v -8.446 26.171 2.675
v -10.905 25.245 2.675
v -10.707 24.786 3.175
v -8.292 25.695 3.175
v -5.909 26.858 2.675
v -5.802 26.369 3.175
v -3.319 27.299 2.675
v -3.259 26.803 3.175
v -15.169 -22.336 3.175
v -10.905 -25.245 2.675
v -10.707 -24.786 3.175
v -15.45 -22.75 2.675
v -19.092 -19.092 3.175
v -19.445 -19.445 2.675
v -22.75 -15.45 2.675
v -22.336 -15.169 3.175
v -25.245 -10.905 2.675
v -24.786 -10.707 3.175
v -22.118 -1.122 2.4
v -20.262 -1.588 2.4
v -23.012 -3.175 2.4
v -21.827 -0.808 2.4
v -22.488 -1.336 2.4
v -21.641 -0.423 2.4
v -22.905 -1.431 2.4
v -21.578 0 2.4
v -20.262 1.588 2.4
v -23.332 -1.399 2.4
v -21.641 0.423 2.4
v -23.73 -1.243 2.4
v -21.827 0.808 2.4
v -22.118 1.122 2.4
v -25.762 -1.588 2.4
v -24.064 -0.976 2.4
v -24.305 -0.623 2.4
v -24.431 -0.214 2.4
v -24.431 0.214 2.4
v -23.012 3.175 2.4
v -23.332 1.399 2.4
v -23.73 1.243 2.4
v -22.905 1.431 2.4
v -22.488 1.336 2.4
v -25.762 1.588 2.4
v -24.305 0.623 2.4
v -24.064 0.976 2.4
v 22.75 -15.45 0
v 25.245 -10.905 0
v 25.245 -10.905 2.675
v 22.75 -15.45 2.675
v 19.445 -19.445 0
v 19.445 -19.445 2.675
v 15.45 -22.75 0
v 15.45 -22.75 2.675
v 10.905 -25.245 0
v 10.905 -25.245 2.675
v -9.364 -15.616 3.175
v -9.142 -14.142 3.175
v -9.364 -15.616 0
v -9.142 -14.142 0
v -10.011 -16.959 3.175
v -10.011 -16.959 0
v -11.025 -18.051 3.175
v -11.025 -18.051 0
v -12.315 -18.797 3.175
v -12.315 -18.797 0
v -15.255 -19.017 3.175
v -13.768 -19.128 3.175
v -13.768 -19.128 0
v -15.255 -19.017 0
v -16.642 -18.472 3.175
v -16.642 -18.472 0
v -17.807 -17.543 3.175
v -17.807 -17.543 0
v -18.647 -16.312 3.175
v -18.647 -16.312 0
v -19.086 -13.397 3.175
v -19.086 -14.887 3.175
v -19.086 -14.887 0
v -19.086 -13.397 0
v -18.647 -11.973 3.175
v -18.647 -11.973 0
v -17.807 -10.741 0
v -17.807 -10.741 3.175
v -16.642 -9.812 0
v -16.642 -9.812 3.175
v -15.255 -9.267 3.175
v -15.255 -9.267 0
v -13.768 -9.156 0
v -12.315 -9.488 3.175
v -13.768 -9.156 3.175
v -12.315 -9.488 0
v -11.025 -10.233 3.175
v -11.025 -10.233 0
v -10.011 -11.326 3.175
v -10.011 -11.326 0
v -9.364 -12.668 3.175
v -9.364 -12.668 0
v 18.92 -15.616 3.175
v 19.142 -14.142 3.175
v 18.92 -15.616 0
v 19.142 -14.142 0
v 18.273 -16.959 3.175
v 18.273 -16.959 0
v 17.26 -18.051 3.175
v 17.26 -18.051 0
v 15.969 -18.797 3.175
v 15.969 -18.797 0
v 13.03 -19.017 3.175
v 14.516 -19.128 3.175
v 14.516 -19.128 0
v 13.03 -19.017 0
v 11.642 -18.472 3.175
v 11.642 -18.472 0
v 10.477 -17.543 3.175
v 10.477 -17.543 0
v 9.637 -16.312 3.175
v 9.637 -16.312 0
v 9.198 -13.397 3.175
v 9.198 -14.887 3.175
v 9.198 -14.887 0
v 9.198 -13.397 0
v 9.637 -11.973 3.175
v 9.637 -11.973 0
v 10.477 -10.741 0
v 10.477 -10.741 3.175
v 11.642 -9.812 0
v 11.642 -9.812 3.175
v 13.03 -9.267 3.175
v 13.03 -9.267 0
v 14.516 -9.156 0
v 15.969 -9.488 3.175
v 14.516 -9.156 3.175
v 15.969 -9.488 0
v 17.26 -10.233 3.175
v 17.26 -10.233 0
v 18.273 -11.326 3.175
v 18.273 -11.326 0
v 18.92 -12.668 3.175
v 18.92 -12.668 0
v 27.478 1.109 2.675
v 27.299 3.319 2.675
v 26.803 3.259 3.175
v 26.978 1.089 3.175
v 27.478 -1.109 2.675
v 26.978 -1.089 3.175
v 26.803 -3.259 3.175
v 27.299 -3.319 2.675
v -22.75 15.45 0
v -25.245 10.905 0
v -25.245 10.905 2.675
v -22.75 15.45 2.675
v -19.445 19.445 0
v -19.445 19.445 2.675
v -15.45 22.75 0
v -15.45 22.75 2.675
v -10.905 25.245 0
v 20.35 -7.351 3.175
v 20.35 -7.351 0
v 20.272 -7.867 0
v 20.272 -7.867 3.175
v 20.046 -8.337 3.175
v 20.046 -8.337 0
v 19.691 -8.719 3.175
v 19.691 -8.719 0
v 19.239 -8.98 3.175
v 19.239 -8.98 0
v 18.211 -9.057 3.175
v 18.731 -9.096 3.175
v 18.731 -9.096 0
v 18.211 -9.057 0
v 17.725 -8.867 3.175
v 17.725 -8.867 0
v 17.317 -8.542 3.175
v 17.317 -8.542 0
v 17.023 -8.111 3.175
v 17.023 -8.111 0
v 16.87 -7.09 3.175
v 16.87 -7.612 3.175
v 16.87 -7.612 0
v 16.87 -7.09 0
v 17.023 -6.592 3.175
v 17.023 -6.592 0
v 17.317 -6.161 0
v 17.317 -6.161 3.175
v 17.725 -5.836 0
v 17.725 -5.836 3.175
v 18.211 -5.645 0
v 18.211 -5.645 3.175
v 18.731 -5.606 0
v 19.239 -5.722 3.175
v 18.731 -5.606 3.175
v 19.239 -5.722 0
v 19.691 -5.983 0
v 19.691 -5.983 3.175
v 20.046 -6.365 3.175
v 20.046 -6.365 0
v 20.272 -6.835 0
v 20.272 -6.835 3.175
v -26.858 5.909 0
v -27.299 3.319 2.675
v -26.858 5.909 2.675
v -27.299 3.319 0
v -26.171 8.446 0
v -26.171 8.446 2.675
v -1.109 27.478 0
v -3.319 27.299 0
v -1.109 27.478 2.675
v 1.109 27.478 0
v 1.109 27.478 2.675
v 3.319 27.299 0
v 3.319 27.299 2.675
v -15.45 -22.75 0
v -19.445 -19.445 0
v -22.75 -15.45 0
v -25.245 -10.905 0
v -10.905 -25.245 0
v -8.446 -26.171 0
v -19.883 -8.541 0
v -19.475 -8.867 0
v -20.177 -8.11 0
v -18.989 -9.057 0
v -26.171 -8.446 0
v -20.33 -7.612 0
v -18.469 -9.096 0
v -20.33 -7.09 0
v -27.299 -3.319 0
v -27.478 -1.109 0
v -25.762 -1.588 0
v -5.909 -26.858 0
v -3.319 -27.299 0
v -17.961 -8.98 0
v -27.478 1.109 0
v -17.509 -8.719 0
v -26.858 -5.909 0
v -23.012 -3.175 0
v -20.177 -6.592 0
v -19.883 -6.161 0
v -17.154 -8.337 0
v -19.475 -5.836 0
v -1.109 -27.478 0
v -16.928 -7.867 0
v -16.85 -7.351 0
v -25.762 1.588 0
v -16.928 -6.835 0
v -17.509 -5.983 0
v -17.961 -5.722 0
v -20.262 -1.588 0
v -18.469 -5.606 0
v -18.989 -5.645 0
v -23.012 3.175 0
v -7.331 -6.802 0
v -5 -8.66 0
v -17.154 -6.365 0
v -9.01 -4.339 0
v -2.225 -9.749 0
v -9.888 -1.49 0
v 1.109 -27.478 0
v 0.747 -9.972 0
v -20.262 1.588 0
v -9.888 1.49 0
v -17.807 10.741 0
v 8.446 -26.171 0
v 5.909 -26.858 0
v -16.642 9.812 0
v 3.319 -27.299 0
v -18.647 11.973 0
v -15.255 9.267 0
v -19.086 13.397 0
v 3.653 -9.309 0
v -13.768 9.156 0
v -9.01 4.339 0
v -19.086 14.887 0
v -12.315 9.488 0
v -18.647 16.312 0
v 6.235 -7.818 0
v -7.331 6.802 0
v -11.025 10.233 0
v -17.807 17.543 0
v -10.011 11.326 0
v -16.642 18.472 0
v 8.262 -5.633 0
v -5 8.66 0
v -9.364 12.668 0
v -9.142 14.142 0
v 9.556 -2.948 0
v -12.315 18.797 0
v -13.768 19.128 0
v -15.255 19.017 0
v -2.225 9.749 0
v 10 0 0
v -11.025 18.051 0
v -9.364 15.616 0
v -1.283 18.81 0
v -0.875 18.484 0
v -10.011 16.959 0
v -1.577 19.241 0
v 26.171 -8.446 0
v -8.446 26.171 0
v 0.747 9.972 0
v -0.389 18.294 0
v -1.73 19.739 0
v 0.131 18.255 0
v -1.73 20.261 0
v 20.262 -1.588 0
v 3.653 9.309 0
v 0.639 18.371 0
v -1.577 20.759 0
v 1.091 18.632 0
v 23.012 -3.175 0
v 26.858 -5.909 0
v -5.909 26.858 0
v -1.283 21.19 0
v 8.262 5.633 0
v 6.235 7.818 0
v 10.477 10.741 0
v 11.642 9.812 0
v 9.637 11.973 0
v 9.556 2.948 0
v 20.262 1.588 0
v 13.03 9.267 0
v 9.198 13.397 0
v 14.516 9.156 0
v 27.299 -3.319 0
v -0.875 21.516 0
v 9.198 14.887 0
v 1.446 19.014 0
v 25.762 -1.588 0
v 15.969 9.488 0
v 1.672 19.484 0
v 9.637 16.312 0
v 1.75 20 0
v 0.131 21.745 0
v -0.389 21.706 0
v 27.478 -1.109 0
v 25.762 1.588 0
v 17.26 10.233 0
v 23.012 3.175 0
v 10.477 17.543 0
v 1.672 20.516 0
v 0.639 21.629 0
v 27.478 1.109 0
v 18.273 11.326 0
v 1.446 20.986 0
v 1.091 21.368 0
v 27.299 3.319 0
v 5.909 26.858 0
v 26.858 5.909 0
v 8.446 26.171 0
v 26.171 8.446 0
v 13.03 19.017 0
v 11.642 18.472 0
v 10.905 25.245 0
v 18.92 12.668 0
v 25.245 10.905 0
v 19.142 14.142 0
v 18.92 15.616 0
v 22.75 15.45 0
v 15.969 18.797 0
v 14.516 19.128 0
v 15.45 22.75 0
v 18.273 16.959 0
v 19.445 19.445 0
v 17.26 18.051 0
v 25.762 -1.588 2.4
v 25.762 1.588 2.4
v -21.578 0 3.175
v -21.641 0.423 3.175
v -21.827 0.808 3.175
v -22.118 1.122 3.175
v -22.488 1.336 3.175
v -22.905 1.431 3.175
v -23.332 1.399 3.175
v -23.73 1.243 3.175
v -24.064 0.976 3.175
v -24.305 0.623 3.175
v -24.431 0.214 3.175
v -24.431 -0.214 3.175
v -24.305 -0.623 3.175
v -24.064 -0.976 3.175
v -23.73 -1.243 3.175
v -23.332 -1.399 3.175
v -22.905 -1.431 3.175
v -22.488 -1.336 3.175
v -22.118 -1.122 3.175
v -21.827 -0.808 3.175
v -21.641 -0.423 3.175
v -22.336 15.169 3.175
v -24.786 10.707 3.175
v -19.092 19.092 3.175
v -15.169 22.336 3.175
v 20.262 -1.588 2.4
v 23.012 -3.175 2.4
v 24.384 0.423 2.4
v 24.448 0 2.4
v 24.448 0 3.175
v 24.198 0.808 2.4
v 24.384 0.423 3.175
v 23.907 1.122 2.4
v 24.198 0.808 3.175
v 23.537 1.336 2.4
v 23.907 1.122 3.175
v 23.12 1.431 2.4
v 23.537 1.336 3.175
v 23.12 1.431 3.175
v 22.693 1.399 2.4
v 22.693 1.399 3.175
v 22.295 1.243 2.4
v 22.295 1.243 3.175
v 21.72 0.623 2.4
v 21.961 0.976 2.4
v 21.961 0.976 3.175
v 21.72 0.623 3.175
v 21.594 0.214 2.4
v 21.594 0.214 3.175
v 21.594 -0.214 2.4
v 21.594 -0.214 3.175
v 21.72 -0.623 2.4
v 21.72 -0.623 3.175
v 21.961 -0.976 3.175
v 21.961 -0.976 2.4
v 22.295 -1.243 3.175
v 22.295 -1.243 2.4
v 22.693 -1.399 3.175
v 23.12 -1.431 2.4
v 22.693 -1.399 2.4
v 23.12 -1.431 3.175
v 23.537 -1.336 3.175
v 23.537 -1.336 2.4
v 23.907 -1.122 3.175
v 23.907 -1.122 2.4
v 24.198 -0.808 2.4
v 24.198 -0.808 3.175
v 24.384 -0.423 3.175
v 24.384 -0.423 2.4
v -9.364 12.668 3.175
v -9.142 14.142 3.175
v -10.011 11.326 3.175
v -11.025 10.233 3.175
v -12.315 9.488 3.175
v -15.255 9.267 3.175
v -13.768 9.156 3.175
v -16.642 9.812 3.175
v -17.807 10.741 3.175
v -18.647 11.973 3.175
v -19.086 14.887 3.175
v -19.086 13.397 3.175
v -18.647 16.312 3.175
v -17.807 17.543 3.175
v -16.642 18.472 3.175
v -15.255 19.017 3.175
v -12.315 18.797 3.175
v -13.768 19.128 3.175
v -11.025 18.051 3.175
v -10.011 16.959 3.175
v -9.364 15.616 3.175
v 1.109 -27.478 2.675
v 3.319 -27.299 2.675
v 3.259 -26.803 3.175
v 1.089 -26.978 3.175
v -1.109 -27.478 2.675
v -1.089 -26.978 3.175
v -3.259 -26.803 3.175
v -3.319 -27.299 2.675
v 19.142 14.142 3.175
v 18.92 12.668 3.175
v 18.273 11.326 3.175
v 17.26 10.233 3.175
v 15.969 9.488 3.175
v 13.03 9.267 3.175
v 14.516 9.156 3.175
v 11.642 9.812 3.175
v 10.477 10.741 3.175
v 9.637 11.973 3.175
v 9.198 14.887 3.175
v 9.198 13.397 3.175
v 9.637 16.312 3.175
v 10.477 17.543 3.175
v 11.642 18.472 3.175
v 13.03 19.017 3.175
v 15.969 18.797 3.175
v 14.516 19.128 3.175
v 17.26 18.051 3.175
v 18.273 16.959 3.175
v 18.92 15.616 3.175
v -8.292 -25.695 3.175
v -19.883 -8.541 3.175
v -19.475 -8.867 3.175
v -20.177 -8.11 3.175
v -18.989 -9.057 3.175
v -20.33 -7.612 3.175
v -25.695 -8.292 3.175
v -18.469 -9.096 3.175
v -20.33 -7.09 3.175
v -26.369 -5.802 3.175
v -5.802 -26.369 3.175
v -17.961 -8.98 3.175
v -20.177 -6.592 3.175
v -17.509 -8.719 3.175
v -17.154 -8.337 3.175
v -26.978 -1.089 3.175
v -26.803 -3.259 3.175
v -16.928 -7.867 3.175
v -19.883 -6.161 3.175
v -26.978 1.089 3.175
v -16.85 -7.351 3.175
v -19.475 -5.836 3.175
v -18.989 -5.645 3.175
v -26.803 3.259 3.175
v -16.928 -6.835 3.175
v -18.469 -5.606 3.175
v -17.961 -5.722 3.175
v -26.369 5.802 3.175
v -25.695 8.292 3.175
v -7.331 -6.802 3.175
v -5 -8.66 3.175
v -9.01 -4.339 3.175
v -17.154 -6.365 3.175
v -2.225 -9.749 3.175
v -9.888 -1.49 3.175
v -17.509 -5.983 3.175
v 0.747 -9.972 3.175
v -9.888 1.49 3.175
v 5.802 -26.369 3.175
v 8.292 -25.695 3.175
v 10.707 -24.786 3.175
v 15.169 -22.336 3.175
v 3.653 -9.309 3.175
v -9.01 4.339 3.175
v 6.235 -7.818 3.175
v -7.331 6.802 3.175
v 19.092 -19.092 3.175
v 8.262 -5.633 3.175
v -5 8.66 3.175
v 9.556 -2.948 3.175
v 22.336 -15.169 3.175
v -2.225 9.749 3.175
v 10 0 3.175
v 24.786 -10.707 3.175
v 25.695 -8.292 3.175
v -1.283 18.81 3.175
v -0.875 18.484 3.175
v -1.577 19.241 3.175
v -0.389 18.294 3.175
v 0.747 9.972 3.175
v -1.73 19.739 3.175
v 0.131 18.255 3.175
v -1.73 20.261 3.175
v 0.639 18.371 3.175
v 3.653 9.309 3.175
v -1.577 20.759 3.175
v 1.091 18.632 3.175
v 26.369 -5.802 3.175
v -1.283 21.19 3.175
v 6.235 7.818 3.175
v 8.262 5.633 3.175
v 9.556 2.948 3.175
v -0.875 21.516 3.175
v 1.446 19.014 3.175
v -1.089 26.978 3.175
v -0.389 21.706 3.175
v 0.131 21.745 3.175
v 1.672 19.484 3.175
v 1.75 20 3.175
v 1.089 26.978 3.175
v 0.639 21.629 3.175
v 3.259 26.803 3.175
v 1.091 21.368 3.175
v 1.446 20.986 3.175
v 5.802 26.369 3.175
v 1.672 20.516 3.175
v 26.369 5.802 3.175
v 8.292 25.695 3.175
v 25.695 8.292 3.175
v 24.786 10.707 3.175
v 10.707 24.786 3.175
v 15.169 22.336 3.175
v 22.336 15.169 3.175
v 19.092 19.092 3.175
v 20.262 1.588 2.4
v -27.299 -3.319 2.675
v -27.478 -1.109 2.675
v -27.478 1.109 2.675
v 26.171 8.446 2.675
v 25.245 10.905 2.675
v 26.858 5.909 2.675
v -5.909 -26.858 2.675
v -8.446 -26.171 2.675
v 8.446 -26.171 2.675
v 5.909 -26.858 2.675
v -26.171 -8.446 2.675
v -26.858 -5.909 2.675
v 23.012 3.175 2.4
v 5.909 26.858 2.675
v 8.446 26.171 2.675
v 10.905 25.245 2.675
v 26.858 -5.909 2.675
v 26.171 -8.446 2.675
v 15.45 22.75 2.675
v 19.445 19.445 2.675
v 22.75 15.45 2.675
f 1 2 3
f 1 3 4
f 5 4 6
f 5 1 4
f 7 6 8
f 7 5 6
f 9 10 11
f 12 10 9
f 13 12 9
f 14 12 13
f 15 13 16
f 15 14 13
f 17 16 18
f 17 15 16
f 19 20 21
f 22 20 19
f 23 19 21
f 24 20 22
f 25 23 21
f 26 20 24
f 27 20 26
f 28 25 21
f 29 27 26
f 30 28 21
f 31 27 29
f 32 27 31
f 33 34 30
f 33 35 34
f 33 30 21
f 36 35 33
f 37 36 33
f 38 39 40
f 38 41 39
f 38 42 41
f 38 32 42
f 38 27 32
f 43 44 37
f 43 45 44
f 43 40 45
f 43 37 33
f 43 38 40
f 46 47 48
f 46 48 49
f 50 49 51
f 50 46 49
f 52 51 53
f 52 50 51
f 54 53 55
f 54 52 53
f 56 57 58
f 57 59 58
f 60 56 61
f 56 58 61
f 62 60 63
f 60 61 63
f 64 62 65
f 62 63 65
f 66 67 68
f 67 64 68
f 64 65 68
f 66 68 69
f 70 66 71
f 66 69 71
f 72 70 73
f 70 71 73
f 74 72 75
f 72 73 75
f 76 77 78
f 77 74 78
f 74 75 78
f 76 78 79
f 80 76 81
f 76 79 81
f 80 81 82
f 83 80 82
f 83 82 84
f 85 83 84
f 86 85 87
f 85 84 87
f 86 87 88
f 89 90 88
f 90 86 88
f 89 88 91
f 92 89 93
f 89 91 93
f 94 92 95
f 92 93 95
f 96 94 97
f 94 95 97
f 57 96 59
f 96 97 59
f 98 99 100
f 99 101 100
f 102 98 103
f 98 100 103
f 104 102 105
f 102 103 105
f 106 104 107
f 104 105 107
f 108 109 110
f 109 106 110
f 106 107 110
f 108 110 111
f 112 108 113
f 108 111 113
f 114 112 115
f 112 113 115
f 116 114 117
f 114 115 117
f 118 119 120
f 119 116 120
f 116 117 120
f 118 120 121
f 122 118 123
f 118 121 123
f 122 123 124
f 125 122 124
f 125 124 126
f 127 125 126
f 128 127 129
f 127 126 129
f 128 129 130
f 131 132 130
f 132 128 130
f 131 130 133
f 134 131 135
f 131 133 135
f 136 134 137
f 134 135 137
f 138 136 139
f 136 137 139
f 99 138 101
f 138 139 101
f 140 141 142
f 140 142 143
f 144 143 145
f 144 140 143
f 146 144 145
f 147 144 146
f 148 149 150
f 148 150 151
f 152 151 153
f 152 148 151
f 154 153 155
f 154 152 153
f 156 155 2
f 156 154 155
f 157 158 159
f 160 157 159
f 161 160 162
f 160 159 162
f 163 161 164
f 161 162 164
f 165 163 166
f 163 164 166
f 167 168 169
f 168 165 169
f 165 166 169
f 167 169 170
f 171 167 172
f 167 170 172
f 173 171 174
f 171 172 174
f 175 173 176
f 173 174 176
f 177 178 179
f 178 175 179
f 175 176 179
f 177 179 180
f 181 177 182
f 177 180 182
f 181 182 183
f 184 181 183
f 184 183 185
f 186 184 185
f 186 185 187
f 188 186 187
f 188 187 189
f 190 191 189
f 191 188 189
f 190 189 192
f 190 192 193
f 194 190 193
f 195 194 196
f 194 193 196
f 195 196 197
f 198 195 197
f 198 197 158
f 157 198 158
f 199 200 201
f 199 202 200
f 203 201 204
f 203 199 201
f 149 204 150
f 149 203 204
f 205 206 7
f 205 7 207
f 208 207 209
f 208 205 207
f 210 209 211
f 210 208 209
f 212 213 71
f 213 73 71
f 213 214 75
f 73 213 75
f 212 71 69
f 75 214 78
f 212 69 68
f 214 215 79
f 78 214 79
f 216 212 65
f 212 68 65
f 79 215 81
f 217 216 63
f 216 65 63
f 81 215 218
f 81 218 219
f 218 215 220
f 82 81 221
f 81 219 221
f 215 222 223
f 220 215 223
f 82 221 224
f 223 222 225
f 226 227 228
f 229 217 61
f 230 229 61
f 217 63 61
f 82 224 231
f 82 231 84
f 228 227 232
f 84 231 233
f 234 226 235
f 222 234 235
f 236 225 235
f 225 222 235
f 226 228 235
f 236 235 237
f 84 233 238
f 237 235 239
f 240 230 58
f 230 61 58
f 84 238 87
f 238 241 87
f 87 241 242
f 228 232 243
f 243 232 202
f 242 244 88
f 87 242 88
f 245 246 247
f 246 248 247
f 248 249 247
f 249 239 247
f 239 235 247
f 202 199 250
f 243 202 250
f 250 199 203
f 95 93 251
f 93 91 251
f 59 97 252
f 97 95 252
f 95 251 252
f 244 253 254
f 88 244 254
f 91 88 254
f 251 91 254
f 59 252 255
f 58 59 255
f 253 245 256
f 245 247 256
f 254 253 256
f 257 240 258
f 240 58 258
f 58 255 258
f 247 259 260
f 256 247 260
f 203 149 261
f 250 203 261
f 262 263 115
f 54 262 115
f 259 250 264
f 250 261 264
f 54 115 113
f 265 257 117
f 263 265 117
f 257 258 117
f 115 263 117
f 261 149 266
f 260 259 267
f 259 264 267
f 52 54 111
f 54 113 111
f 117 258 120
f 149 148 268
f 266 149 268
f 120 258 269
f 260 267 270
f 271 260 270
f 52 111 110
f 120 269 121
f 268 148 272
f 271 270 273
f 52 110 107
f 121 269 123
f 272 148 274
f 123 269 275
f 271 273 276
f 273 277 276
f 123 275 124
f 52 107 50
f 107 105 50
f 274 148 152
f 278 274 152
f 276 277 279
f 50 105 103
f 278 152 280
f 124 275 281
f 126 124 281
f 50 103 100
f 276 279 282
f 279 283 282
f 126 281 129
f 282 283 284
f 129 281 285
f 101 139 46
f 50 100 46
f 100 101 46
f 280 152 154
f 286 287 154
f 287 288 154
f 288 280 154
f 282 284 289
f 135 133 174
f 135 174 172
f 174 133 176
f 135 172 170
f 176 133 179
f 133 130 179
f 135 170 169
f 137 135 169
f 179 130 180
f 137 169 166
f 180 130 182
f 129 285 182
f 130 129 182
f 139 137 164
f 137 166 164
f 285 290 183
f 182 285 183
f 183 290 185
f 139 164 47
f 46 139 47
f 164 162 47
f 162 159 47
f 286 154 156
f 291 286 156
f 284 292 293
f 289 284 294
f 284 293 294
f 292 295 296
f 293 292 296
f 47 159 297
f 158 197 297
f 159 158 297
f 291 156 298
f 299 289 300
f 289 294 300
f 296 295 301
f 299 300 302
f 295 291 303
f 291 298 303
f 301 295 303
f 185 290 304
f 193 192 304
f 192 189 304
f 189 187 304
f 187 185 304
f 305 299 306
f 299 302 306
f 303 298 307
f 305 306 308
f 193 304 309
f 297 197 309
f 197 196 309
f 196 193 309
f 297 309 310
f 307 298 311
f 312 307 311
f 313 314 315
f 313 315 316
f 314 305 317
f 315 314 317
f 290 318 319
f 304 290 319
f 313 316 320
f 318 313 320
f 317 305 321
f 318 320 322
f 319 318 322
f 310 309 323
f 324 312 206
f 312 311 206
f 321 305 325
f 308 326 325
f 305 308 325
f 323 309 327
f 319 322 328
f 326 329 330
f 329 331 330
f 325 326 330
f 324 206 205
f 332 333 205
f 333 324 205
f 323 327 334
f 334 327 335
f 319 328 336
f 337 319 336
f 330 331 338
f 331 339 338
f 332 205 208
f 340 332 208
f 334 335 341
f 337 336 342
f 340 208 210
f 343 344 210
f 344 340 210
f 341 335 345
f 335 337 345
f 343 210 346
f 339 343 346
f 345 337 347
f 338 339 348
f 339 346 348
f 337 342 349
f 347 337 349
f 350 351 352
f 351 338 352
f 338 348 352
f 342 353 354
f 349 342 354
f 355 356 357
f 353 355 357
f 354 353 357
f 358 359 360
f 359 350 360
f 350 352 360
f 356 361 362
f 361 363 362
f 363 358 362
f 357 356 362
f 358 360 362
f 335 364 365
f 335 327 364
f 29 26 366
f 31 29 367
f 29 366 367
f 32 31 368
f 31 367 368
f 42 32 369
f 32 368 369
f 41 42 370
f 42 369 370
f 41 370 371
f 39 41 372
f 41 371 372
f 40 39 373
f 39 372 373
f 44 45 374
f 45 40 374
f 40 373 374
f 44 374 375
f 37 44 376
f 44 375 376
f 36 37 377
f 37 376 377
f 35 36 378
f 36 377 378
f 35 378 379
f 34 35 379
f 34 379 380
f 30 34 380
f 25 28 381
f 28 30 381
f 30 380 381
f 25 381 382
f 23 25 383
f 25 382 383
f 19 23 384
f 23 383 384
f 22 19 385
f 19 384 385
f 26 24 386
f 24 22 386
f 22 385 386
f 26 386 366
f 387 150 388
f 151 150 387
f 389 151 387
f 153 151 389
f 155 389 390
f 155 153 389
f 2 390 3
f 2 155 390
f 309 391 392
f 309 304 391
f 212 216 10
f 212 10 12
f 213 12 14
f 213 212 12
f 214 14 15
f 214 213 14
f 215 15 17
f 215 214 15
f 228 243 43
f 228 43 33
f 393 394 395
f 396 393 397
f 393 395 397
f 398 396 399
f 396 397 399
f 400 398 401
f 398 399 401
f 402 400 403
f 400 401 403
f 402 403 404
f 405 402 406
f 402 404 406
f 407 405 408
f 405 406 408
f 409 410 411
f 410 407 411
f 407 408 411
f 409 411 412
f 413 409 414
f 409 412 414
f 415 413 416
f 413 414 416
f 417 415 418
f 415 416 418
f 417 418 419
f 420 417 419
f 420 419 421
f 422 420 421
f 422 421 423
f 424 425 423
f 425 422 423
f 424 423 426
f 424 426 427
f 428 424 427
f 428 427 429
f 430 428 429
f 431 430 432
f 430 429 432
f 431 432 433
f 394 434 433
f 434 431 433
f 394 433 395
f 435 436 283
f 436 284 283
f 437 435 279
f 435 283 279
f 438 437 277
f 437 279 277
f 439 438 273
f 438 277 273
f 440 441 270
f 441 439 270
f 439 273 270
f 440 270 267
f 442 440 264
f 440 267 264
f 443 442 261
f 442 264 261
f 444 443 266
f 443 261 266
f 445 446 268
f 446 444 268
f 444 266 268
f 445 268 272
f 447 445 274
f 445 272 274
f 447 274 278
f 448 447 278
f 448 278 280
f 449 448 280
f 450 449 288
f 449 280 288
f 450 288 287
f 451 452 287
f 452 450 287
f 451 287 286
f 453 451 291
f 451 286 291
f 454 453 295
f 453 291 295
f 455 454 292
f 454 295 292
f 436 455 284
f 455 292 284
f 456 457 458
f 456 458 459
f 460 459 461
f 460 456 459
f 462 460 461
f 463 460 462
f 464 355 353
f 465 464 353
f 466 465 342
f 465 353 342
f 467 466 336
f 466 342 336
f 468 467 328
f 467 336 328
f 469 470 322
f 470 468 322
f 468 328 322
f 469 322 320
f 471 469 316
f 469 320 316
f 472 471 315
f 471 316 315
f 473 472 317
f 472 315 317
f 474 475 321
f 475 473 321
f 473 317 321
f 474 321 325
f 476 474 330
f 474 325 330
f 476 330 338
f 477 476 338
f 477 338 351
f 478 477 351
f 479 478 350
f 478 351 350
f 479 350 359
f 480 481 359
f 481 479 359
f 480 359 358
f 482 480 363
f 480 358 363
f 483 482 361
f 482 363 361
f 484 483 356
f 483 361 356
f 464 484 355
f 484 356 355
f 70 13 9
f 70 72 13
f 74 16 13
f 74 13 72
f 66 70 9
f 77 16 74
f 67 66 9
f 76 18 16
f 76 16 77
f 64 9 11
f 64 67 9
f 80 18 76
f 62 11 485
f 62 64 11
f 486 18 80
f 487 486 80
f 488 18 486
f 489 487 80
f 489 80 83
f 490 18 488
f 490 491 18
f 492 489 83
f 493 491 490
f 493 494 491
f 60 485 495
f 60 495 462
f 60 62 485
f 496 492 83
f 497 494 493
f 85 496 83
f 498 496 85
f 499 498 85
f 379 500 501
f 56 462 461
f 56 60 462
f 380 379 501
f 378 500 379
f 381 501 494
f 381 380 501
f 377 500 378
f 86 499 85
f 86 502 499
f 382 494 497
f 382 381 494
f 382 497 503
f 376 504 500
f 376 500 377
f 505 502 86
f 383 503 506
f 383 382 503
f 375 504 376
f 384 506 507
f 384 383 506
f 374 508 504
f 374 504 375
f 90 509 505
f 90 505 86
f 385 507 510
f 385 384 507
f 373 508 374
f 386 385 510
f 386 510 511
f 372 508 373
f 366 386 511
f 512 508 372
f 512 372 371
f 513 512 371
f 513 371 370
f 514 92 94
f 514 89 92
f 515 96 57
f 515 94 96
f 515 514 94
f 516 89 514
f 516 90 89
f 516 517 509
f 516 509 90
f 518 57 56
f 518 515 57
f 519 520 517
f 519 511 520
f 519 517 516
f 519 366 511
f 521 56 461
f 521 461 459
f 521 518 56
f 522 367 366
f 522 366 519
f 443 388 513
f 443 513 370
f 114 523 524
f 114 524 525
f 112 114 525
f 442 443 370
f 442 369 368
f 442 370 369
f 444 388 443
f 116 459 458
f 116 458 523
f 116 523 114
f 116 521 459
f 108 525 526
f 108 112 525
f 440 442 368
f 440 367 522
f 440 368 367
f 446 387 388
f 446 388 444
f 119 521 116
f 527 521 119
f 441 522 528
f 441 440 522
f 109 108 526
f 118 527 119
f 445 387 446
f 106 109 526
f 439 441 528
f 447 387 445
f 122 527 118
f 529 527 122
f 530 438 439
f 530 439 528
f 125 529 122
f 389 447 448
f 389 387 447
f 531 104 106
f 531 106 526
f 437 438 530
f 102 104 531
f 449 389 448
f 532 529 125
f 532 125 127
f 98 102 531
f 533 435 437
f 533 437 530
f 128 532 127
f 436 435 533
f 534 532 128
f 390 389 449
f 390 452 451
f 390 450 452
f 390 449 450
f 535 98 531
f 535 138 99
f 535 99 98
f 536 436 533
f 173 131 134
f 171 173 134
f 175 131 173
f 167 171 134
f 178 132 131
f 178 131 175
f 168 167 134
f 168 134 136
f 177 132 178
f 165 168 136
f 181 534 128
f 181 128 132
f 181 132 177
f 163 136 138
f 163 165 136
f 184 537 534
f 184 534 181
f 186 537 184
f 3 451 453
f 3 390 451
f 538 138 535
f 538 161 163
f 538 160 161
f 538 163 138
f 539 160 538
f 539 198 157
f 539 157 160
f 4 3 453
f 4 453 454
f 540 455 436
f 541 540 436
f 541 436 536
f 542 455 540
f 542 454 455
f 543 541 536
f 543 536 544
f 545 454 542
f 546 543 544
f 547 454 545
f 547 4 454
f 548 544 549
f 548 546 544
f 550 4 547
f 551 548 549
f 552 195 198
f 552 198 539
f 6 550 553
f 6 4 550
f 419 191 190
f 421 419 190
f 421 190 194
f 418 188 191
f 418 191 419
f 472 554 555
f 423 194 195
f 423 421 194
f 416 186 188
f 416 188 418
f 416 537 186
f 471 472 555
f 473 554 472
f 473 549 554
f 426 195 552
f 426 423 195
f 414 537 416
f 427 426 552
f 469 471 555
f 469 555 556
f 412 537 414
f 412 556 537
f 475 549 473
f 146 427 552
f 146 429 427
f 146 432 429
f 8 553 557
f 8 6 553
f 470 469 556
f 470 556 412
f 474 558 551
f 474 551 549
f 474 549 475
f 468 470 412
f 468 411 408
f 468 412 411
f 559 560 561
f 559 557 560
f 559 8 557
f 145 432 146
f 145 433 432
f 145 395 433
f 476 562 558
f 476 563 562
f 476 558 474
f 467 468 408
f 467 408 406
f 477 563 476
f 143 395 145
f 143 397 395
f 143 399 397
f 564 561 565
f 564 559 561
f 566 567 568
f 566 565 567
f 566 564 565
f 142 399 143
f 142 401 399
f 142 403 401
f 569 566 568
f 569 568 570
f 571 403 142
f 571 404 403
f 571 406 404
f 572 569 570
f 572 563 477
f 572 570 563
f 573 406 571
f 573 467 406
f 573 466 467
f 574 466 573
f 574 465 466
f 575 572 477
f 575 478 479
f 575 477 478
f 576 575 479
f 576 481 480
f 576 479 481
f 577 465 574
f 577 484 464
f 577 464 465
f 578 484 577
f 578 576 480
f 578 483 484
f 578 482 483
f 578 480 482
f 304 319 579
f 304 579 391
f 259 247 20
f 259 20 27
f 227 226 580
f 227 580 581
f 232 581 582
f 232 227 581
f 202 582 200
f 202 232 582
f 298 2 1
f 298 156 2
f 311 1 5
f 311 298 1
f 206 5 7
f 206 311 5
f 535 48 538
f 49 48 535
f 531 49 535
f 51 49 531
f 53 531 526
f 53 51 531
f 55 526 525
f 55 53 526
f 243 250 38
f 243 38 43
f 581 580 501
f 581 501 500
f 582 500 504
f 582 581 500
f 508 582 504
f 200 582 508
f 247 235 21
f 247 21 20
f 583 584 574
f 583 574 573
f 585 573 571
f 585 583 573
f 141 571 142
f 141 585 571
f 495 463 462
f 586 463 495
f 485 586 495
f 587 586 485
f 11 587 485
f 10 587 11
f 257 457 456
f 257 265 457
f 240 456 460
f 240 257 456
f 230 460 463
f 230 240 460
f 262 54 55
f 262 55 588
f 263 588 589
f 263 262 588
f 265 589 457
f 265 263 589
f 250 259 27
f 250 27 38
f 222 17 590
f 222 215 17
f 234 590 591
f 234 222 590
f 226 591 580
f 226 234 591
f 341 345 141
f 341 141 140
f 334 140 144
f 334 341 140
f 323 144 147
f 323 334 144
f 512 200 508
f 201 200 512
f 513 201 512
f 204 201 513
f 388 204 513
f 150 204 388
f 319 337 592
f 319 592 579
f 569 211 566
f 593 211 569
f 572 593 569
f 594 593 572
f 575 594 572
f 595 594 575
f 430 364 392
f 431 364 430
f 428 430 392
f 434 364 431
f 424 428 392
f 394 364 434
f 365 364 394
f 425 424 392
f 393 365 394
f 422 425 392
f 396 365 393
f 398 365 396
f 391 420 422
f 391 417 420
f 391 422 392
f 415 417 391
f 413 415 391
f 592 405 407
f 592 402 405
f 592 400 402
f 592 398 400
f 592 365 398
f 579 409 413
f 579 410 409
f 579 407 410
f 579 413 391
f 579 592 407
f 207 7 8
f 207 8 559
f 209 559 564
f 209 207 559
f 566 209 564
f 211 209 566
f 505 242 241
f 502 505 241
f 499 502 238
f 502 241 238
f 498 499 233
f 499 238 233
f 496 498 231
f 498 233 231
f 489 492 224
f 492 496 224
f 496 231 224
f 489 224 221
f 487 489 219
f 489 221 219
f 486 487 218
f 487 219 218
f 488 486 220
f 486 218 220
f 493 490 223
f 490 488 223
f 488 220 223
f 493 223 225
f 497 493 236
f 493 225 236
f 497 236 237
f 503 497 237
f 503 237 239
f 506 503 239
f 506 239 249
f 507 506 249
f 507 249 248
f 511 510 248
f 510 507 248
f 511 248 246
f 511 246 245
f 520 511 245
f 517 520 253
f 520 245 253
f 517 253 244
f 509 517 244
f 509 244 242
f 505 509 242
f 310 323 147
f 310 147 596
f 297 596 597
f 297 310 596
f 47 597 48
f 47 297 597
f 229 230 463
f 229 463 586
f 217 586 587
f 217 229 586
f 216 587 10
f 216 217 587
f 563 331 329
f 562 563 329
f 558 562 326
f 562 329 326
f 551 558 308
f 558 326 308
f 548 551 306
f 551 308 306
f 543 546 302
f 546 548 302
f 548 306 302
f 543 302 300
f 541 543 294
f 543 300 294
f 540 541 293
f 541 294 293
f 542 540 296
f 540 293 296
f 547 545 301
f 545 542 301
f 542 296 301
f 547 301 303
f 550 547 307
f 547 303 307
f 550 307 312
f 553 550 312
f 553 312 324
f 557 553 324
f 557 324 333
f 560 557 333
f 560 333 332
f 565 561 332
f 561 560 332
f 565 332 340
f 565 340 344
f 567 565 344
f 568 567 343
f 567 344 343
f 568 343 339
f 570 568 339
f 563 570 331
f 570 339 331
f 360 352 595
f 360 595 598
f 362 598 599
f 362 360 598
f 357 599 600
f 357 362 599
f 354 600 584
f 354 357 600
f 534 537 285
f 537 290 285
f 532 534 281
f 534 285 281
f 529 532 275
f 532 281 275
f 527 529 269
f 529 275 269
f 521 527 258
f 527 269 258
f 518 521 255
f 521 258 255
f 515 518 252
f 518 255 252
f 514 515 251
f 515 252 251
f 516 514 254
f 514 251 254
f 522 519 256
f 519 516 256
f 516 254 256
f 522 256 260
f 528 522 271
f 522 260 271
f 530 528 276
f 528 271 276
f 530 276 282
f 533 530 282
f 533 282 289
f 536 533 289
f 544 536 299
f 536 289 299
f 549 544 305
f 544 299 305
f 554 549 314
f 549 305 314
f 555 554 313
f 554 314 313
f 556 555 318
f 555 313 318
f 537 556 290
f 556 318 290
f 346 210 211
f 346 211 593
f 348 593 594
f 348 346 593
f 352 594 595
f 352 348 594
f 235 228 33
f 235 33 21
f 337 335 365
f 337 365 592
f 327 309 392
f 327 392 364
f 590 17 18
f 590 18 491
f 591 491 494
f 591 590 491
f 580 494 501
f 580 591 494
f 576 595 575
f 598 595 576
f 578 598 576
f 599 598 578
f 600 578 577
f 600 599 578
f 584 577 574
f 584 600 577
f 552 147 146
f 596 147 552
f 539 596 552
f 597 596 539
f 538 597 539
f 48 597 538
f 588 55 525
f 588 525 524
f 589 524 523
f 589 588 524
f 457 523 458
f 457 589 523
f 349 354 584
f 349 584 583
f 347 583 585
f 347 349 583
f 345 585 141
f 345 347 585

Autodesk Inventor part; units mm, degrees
ref_plane "YZ Plane" through (0, 0, 0) normal (1, 0, 0) x (0, 1, 0)
ref_plane "XZ Plane" through (0, 0, 0) normal (0, 1, 0) x (-1, 0, 0)
ref_plane "XY Plane" through (0, 0, 0) normal (0, 0, 1) x (1, 0, 0)
sketch "Sketch1" plane through (0, 0, 0) normal (0, 0, 1) x (1, 0, 0)
  circle A0 centre (-43.950789, -25.375) radius 1.8
  circle A1 centre (0, -50.75) radius 1.8
  circle A2 centre (43.950789, -25.375) radius 1.8
  circle A3 centre (43.950789, 25.375) radius 1.8
  circle A4 centre (0, 50.75) radius 1.8
  circle A5 centre (-43.950789, 25.375) radius 1.8
  circle A6 centre (0, 0) radius 55
  circle A7 centre (0, 0) radius 10
  line L0 (-5, -45.365185) -> (-5, -28.788018)
  arc A8 (-3.318966, -27.298983) -> (-5, -28.788018) centre (-3.5, -28.788018) ccw
  arc A9 (-3.318966, -27.298983) -> (3.318966, -27.298983) centre (0, 0) ccw
  arc A10 (5, -28.788018) -> (3.318966, -27.298983) centre (3.5, -28.788018) ccw
  line L1 (5, -28.788018) -> (5, -45.365185)
  arc A11 (3.615385, -46.86074) -> (5, -45.365185) centre (3.5, -45.365185) ccw
  arc A12 (-3.615385, -46.86074) -> (3.615385, -46.86074) centre (0, 0) ccw
  arc A13 (-5, -45.365185) -> (-3.615385, -46.86074) centre (-3.5, -45.365185) ccw
  arc A14 (3.615385, 46.86074) -> (-3.615385, 46.86074) centre (0, 0) ccw
  arc A15 (5, 45.365185) -> (3.615385, 46.86074) centre (3.5, 45.365185) ccw
  line L2 (5, 45.365185) -> (5, 28.788018)
  arc A16 (3.318966, 27.298983) -> (5, 28.788018) centre (3.5, 28.788018) ccw
  arc A17 (3.318966, 27.298983) -> (-3.318966, 27.298983) centre (0, 0) ccw
  arc A18 (-5, 28.788018) -> (-3.318966, 27.298983) centre (-3.5, 28.788018) ccw
  line L3 (-5, 28.788018) -> (-5, 45.365185)
  arc A19 (-3.615385, 46.86074) -> (-5, 45.365185) centre (-3.5, 45.365185) ccw
  circle A20 centre (25.375, -43.950789) radius 3.75
  arc A21 (11.879121, -45.47402) -> (23.5, -40.703194) centre (0, 0) ccw
  arc A22 (10, -44.022721) -> (11.879121, -45.47402) centre (11.5, -44.022721) ccw
  line L4 (10, -44.022721) -> (10, -26.622359)
  arc A23 (10.905172, -25.24534) -> (10, -26.622359) centre (11.5, -26.622359) ccw
  arc A24 (10.905172, -25.24534) -> (25.24534, -10.905172) centre (0, 0) ccw
  arc A25 (26.622359, -10) -> (25.24534, -10.905172) centre (26.622359, -11.5) ccw
  line L5 (26.622359, -10) -> (44.022721, -10)
  arc A26 (45.47402, -11.879121) -> (44.022721, -10) centre (44.022721, -11.5) ccw
  arc A27 (23.5, -40.703194) -> (45.47402, -11.879121) centre (0, 0) ccw
  circle A28 centre (-50.75, 0) radius 3.75
  arc A29 (-46.86074, 3.615385) -> (-47, 0) centre (0, 0) ccw
  arc A30 (-45.365185, 5) -> (-46.86074, 3.615385) centre (-45.365185, 3.5) ccw
  line L6 (-45.365185, 5) -> (-28.788018, 5)
  arc A31 (-27.298983, 3.318966) -> (-28.788018, 5) centre (-28.788018, 3.5) ccw
  arc A32 (-27.298983, 3.318966) -> (-27.298983, -3.318966) centre (0, 0) ccw
  arc A33 (-28.788018, -5) -> (-27.298983, -3.318966) centre (-28.788018, -3.5) ccw
  line L7 (-28.788018, -5) -> (-45.365185, -5)
  arc A34 (-46.86074, -3.615385) -> (-45.365185, -5) centre (-45.365185, -3.5) ccw
  arc A35 (-47, 0) -> (-46.86074, -3.615385) centre (0, 0) ccw
  circle A36 centre (25.375, 43.950789) radius 3.75
  arc A37 (45.47402, 11.879121) -> (23.5, 40.703194) centre (0, 0) ccw
  arc A38 (44.022721, 10) -> (45.47402, 11.879121) centre (44.022721, 11.5) ccw
  line L8 (44.022721, 10) -> (26.622359, 10)
  arc A39 (25.24534, 10.905172) -> (26.622359, 10) centre (26.622359, 11.5) ccw
  arc A40 (25.24534, 10.905172) -> (10.905172, 25.24534) centre (0, 0) ccw
  arc A41 (10, 26.622359) -> (10.905172, 25.24534) centre (11.5, 26.622359) ccw
  line L9 (10, 26.622359) -> (10, 44.022721)
  arc A42 (11.879121, 45.47402) -> (10, 44.022721) centre (11.5, 44.022721) ccw
  arc A43 (23.5, 40.703194) -> (11.879121, 45.47402) centre (0, 0) ccw
  circle A44 centre (-25.375, 43.950789) radius 3.75
  arc A45 (-11.879121, 45.47402) -> (-23.5, 40.703194) centre (0, 0) ccw
  arc A46 (-10, 44.022721) -> (-11.879121, 45.47402) centre (-11.5, 44.022721) ccw
  line L10 (-10, 44.022721) -> (-10, 26.622359)
  arc A47 (-10.905172, 25.24534) -> (-10, 26.622359) centre (-11.5, 26.622359) ccw
  arc A48 (-10.905172, 25.24534) -> (-25.24534, 10.905172) centre (0, 0) ccw
  arc A49 (-26.622359, 10) -> (-25.24534, 10.905172) centre (-26.622359, 11.5) ccw
  line L11 (-26.622359, 10) -> (-44.022721, 10)
  arc A50 (-45.47402, 11.879121) -> (-44.022721, 10) centre (-44.022721, 11.5) ccw
  arc A51 (-23.5, 40.703194) -> (-45.47402, 11.879121) centre (0, 0) ccw
  circle A52 centre (-25.375, -43.950789) radius 3.75
  arc A53 (-45.47402, -11.879121) -> (-23.5, -40.703194) centre (0, 0) ccw
  arc A54 (-44.022721, -10) -> (-45.47402, -11.879121) centre (-44.022721, -11.5) ccw
  line L12 (-44.022721, -10) -> (-26.622359, -10)
  arc A55 (-25.24534, -10.905172) -> (-26.622359, -10) centre (-26.622359, -11.5) ccw
  arc A56 (-25.24534, -10.905172) -> (-10.905172, -25.24534) centre (0, 0) ccw
  arc A57 (-10, -26.622359) -> (-10.905172, -25.24534) centre (-11.5, -26.622359) ccw
  line L13 (-10, -26.622359) -> (-10, -44.022721)
  arc A58 (-11.879121, -45.47402) -> (-10, -44.022721) centre (-11.5, -44.022721) ccw
  arc A59 (-23.5, -40.703194) -> (-11.879121, -45.47402) centre (0, 0) ccw
  circle A60 centre (50.75, 0) radius 3.75
  arc A61 (46.86074, -3.615385) -> (47, 0) centre (0, 0) ccw
  arc A62 (45.365185, -5) -> (46.86074, -3.615385) centre (45.365185, -3.5) ccw
  line L14 (45.365185, -5) -> (28.788018, -5)
  arc A63 (27.298983, -3.318966) -> (28.788018, -5) centre (28.788018, -3.5) ccw
  arc A64 (27.298983, -3.318966) -> (27.298983, 3.318966) centre (0, 0) ccw
  arc A65 (28.788018, 5) -> (27.298983, 3.318966) centre (28.788018, 3.5) ccw
  line L15 (28.788018, 5) -> (45.365185, 5)
  arc A66 (46.86074, 3.615385) -> (45.365185, 5) centre (45.365185, 3.5) ccw
  arc A67 (47, 0) -> (46.86074, 3.615385) centre (0, 0) ccw
  circle A68 centre (-14.142136, -14.142136) radius 5
  circle A69 centre (14.142136, 14.142136) radius 5
  circle A70 centre (-14.142136, 14.142136) radius 5
  circle A71 centre (14.142136, -14.142136) radius 5
  circle A72 centre (0, 0) radius 27.5
  circle A73 centre (0, 20) radius 1.75
  circle A74 centre (-18.600039, -7.351092) radius 1.75
  circle A75 centre (18.59999, -7.351217) radius 1.75
  point P0 (0, 0)
  point P1 (-27.298983, -3.318966)
  point P2 (-25.24534, -10.905172)
  point P3 (-10.905172, -25.24534)
  point P4 (3.318966, -27.298983)
  point P5 (25.24534, -10.905172)
  point P6 (27.298983, 3.318966)
  point P7 (25.24534, 10.905172)
  point P8 (10.905172, 25.24534)
  point P9 (-3.318966, 27.298983)
  point P10 (-25.24534, 10.905172)
sketch "Sketch1 outline for Extrusion1" plane through (0, 0, 0) normal (0, 0, 1) x (1, 0, 0)
  arc A0 (-27.298983, -3.318966) -> (-25.24534, -10.905172) centre (0, 0) ccw
  arc A1 (-27.298983, 3.318966) -> (-27.298983, -3.318966) centre (0, 0) ccw
  arc A2 (-25.24534, -10.905172) -> (-10.905172, -25.24534) centre (0, 0) ccw
  arc A3 (-25.24534, 10.905172) -> (-27.298983, 3.318966) centre (0, 0) ccw
  arc A4 (-10.905172, -25.24534) -> (-3.318966, -27.298983) centre (0, 0) ccw
  arc A5 (-10.905172, 25.24534) -> (-25.24534, 10.905172) centre (0, 0) ccw
  arc A6 (-3.318966, -27.298983) -> (3.318966, -27.298983) centre (0, 0) ccw
  arc A7 (-3.318966, 27.298983) -> (-10.905172, 25.24534) centre (0, 0) ccw
  arc A8 (3.318966, -27.298983) -> (10.905172, -25.24534) centre (0, 0) ccw
  arc A9 (3.318966, 27.298983) -> (-3.318966, 27.298983) centre (0, 0) ccw
  arc A10 (10.905172, -25.24534) -> (25.24534, -10.905172) centre (0, 0) ccw
  arc A11 (10.905172, 25.24534) -> (3.318966, 27.298983) centre (0, 0) ccw
  arc A12 (25.24534, -10.905172) -> (27.298983, -3.318966) centre (0, 0) ccw
  arc A13 (25.24534, 10.905172) -> (10.905172, 25.24534) centre (0, 0) ccw
  arc A14 (27.298983, -3.318966) -> (27.298983, 3.318966) centre (0, 0) ccw
  arc A15 (27.298983, 3.318966) -> (25.24534, 10.905172) centre (0, 0) ccw
  circle A16 centre (-14.142136, -14.142136) radius 5
  circle A17 centre (-18.600039, -7.351092) radius 1.75
  circle A18 centre (14.142136, -14.142136) radius 5
  circle A19 centre (0, 0) radius 10
  circle A20 centre (18.59999, -7.351217) radius 1.75
  circle A21 centre (-14.142136, 14.142136) radius 5
  circle A22 centre (0, 20) radius 1.75
  circle A23 centre (14.142136, 14.142136) radius 5
extrude "Extrusion1" add sketch "Sketch1 outline for Extrusion1" along normal blind 3.175
sketch "Sketch2" plane through (0, 0, 3.175) normal (0, 0, 1) x (1, 0, 0)
  circle A0 centre (-23.0125, 0) radius 1.435 projected
  circle A1 centre (23.0125, 0) radius 1.435 projected
  point P0 (0, 0)
extrude "Extrusion2" cut sketch "Sketch2" against normal blind 3.175
sketch "Sketch3" plane through (0, 0, 0) normal (0, 0, -1) x (-1, 0, 0)
  circle A0 centre (-23.0125, 0) radius 1.435
  circle A1 centre (23.0125, 0) radius 1.435
  line L0 (-23.0125, 3.175426) -> (-20.2625, 1.587713)
  line L1 (-20.2625, 1.587713) -> (-20.2625, -1.587713)
  line L2 (-20.2625, -1.587713) -> (-23.0125, -3.175426)
  line L3 (-23.0125, -3.175426) -> (-25.7625, -1.587713)
  line L4 (-25.7625, -1.587713) -> (-25.7625, 1.587713)
  line L5 (-25.7625, 1.587713) -> (-23.0125, 3.175426)
  circle A2 centre (23.0125, 0) radius 1.435
  line L6 (23.0125, 3.175426) -> (25.7625, 1.587713)
  line L7 (25.7625, 1.587713) -> (25.7625, -1.587713)
  line L8 (25.7625, -1.587713) -> (23.0125, -3.175426)
  line L9 (23.0125, -3.175426) -> (20.2625, -1.587713)
  line L10 (20.2625, -1.587713) -> (20.2625, 1.587713)
  line L11 (20.2625, 1.587713) -> (23.0125, 3.175426)
  point P0 (0, 0)
  dimension "d4" = 5.5
  dimension "d5" = 5.5
extrude "Extrusion3" cut sketch "Sketch3" against normal blind 2.4
chamfer "Chamfer1" distance 0.5 angle 45 1 edges at (-25.2453, -10.9052, 3.175)
properties part number "AMT102Mount"
